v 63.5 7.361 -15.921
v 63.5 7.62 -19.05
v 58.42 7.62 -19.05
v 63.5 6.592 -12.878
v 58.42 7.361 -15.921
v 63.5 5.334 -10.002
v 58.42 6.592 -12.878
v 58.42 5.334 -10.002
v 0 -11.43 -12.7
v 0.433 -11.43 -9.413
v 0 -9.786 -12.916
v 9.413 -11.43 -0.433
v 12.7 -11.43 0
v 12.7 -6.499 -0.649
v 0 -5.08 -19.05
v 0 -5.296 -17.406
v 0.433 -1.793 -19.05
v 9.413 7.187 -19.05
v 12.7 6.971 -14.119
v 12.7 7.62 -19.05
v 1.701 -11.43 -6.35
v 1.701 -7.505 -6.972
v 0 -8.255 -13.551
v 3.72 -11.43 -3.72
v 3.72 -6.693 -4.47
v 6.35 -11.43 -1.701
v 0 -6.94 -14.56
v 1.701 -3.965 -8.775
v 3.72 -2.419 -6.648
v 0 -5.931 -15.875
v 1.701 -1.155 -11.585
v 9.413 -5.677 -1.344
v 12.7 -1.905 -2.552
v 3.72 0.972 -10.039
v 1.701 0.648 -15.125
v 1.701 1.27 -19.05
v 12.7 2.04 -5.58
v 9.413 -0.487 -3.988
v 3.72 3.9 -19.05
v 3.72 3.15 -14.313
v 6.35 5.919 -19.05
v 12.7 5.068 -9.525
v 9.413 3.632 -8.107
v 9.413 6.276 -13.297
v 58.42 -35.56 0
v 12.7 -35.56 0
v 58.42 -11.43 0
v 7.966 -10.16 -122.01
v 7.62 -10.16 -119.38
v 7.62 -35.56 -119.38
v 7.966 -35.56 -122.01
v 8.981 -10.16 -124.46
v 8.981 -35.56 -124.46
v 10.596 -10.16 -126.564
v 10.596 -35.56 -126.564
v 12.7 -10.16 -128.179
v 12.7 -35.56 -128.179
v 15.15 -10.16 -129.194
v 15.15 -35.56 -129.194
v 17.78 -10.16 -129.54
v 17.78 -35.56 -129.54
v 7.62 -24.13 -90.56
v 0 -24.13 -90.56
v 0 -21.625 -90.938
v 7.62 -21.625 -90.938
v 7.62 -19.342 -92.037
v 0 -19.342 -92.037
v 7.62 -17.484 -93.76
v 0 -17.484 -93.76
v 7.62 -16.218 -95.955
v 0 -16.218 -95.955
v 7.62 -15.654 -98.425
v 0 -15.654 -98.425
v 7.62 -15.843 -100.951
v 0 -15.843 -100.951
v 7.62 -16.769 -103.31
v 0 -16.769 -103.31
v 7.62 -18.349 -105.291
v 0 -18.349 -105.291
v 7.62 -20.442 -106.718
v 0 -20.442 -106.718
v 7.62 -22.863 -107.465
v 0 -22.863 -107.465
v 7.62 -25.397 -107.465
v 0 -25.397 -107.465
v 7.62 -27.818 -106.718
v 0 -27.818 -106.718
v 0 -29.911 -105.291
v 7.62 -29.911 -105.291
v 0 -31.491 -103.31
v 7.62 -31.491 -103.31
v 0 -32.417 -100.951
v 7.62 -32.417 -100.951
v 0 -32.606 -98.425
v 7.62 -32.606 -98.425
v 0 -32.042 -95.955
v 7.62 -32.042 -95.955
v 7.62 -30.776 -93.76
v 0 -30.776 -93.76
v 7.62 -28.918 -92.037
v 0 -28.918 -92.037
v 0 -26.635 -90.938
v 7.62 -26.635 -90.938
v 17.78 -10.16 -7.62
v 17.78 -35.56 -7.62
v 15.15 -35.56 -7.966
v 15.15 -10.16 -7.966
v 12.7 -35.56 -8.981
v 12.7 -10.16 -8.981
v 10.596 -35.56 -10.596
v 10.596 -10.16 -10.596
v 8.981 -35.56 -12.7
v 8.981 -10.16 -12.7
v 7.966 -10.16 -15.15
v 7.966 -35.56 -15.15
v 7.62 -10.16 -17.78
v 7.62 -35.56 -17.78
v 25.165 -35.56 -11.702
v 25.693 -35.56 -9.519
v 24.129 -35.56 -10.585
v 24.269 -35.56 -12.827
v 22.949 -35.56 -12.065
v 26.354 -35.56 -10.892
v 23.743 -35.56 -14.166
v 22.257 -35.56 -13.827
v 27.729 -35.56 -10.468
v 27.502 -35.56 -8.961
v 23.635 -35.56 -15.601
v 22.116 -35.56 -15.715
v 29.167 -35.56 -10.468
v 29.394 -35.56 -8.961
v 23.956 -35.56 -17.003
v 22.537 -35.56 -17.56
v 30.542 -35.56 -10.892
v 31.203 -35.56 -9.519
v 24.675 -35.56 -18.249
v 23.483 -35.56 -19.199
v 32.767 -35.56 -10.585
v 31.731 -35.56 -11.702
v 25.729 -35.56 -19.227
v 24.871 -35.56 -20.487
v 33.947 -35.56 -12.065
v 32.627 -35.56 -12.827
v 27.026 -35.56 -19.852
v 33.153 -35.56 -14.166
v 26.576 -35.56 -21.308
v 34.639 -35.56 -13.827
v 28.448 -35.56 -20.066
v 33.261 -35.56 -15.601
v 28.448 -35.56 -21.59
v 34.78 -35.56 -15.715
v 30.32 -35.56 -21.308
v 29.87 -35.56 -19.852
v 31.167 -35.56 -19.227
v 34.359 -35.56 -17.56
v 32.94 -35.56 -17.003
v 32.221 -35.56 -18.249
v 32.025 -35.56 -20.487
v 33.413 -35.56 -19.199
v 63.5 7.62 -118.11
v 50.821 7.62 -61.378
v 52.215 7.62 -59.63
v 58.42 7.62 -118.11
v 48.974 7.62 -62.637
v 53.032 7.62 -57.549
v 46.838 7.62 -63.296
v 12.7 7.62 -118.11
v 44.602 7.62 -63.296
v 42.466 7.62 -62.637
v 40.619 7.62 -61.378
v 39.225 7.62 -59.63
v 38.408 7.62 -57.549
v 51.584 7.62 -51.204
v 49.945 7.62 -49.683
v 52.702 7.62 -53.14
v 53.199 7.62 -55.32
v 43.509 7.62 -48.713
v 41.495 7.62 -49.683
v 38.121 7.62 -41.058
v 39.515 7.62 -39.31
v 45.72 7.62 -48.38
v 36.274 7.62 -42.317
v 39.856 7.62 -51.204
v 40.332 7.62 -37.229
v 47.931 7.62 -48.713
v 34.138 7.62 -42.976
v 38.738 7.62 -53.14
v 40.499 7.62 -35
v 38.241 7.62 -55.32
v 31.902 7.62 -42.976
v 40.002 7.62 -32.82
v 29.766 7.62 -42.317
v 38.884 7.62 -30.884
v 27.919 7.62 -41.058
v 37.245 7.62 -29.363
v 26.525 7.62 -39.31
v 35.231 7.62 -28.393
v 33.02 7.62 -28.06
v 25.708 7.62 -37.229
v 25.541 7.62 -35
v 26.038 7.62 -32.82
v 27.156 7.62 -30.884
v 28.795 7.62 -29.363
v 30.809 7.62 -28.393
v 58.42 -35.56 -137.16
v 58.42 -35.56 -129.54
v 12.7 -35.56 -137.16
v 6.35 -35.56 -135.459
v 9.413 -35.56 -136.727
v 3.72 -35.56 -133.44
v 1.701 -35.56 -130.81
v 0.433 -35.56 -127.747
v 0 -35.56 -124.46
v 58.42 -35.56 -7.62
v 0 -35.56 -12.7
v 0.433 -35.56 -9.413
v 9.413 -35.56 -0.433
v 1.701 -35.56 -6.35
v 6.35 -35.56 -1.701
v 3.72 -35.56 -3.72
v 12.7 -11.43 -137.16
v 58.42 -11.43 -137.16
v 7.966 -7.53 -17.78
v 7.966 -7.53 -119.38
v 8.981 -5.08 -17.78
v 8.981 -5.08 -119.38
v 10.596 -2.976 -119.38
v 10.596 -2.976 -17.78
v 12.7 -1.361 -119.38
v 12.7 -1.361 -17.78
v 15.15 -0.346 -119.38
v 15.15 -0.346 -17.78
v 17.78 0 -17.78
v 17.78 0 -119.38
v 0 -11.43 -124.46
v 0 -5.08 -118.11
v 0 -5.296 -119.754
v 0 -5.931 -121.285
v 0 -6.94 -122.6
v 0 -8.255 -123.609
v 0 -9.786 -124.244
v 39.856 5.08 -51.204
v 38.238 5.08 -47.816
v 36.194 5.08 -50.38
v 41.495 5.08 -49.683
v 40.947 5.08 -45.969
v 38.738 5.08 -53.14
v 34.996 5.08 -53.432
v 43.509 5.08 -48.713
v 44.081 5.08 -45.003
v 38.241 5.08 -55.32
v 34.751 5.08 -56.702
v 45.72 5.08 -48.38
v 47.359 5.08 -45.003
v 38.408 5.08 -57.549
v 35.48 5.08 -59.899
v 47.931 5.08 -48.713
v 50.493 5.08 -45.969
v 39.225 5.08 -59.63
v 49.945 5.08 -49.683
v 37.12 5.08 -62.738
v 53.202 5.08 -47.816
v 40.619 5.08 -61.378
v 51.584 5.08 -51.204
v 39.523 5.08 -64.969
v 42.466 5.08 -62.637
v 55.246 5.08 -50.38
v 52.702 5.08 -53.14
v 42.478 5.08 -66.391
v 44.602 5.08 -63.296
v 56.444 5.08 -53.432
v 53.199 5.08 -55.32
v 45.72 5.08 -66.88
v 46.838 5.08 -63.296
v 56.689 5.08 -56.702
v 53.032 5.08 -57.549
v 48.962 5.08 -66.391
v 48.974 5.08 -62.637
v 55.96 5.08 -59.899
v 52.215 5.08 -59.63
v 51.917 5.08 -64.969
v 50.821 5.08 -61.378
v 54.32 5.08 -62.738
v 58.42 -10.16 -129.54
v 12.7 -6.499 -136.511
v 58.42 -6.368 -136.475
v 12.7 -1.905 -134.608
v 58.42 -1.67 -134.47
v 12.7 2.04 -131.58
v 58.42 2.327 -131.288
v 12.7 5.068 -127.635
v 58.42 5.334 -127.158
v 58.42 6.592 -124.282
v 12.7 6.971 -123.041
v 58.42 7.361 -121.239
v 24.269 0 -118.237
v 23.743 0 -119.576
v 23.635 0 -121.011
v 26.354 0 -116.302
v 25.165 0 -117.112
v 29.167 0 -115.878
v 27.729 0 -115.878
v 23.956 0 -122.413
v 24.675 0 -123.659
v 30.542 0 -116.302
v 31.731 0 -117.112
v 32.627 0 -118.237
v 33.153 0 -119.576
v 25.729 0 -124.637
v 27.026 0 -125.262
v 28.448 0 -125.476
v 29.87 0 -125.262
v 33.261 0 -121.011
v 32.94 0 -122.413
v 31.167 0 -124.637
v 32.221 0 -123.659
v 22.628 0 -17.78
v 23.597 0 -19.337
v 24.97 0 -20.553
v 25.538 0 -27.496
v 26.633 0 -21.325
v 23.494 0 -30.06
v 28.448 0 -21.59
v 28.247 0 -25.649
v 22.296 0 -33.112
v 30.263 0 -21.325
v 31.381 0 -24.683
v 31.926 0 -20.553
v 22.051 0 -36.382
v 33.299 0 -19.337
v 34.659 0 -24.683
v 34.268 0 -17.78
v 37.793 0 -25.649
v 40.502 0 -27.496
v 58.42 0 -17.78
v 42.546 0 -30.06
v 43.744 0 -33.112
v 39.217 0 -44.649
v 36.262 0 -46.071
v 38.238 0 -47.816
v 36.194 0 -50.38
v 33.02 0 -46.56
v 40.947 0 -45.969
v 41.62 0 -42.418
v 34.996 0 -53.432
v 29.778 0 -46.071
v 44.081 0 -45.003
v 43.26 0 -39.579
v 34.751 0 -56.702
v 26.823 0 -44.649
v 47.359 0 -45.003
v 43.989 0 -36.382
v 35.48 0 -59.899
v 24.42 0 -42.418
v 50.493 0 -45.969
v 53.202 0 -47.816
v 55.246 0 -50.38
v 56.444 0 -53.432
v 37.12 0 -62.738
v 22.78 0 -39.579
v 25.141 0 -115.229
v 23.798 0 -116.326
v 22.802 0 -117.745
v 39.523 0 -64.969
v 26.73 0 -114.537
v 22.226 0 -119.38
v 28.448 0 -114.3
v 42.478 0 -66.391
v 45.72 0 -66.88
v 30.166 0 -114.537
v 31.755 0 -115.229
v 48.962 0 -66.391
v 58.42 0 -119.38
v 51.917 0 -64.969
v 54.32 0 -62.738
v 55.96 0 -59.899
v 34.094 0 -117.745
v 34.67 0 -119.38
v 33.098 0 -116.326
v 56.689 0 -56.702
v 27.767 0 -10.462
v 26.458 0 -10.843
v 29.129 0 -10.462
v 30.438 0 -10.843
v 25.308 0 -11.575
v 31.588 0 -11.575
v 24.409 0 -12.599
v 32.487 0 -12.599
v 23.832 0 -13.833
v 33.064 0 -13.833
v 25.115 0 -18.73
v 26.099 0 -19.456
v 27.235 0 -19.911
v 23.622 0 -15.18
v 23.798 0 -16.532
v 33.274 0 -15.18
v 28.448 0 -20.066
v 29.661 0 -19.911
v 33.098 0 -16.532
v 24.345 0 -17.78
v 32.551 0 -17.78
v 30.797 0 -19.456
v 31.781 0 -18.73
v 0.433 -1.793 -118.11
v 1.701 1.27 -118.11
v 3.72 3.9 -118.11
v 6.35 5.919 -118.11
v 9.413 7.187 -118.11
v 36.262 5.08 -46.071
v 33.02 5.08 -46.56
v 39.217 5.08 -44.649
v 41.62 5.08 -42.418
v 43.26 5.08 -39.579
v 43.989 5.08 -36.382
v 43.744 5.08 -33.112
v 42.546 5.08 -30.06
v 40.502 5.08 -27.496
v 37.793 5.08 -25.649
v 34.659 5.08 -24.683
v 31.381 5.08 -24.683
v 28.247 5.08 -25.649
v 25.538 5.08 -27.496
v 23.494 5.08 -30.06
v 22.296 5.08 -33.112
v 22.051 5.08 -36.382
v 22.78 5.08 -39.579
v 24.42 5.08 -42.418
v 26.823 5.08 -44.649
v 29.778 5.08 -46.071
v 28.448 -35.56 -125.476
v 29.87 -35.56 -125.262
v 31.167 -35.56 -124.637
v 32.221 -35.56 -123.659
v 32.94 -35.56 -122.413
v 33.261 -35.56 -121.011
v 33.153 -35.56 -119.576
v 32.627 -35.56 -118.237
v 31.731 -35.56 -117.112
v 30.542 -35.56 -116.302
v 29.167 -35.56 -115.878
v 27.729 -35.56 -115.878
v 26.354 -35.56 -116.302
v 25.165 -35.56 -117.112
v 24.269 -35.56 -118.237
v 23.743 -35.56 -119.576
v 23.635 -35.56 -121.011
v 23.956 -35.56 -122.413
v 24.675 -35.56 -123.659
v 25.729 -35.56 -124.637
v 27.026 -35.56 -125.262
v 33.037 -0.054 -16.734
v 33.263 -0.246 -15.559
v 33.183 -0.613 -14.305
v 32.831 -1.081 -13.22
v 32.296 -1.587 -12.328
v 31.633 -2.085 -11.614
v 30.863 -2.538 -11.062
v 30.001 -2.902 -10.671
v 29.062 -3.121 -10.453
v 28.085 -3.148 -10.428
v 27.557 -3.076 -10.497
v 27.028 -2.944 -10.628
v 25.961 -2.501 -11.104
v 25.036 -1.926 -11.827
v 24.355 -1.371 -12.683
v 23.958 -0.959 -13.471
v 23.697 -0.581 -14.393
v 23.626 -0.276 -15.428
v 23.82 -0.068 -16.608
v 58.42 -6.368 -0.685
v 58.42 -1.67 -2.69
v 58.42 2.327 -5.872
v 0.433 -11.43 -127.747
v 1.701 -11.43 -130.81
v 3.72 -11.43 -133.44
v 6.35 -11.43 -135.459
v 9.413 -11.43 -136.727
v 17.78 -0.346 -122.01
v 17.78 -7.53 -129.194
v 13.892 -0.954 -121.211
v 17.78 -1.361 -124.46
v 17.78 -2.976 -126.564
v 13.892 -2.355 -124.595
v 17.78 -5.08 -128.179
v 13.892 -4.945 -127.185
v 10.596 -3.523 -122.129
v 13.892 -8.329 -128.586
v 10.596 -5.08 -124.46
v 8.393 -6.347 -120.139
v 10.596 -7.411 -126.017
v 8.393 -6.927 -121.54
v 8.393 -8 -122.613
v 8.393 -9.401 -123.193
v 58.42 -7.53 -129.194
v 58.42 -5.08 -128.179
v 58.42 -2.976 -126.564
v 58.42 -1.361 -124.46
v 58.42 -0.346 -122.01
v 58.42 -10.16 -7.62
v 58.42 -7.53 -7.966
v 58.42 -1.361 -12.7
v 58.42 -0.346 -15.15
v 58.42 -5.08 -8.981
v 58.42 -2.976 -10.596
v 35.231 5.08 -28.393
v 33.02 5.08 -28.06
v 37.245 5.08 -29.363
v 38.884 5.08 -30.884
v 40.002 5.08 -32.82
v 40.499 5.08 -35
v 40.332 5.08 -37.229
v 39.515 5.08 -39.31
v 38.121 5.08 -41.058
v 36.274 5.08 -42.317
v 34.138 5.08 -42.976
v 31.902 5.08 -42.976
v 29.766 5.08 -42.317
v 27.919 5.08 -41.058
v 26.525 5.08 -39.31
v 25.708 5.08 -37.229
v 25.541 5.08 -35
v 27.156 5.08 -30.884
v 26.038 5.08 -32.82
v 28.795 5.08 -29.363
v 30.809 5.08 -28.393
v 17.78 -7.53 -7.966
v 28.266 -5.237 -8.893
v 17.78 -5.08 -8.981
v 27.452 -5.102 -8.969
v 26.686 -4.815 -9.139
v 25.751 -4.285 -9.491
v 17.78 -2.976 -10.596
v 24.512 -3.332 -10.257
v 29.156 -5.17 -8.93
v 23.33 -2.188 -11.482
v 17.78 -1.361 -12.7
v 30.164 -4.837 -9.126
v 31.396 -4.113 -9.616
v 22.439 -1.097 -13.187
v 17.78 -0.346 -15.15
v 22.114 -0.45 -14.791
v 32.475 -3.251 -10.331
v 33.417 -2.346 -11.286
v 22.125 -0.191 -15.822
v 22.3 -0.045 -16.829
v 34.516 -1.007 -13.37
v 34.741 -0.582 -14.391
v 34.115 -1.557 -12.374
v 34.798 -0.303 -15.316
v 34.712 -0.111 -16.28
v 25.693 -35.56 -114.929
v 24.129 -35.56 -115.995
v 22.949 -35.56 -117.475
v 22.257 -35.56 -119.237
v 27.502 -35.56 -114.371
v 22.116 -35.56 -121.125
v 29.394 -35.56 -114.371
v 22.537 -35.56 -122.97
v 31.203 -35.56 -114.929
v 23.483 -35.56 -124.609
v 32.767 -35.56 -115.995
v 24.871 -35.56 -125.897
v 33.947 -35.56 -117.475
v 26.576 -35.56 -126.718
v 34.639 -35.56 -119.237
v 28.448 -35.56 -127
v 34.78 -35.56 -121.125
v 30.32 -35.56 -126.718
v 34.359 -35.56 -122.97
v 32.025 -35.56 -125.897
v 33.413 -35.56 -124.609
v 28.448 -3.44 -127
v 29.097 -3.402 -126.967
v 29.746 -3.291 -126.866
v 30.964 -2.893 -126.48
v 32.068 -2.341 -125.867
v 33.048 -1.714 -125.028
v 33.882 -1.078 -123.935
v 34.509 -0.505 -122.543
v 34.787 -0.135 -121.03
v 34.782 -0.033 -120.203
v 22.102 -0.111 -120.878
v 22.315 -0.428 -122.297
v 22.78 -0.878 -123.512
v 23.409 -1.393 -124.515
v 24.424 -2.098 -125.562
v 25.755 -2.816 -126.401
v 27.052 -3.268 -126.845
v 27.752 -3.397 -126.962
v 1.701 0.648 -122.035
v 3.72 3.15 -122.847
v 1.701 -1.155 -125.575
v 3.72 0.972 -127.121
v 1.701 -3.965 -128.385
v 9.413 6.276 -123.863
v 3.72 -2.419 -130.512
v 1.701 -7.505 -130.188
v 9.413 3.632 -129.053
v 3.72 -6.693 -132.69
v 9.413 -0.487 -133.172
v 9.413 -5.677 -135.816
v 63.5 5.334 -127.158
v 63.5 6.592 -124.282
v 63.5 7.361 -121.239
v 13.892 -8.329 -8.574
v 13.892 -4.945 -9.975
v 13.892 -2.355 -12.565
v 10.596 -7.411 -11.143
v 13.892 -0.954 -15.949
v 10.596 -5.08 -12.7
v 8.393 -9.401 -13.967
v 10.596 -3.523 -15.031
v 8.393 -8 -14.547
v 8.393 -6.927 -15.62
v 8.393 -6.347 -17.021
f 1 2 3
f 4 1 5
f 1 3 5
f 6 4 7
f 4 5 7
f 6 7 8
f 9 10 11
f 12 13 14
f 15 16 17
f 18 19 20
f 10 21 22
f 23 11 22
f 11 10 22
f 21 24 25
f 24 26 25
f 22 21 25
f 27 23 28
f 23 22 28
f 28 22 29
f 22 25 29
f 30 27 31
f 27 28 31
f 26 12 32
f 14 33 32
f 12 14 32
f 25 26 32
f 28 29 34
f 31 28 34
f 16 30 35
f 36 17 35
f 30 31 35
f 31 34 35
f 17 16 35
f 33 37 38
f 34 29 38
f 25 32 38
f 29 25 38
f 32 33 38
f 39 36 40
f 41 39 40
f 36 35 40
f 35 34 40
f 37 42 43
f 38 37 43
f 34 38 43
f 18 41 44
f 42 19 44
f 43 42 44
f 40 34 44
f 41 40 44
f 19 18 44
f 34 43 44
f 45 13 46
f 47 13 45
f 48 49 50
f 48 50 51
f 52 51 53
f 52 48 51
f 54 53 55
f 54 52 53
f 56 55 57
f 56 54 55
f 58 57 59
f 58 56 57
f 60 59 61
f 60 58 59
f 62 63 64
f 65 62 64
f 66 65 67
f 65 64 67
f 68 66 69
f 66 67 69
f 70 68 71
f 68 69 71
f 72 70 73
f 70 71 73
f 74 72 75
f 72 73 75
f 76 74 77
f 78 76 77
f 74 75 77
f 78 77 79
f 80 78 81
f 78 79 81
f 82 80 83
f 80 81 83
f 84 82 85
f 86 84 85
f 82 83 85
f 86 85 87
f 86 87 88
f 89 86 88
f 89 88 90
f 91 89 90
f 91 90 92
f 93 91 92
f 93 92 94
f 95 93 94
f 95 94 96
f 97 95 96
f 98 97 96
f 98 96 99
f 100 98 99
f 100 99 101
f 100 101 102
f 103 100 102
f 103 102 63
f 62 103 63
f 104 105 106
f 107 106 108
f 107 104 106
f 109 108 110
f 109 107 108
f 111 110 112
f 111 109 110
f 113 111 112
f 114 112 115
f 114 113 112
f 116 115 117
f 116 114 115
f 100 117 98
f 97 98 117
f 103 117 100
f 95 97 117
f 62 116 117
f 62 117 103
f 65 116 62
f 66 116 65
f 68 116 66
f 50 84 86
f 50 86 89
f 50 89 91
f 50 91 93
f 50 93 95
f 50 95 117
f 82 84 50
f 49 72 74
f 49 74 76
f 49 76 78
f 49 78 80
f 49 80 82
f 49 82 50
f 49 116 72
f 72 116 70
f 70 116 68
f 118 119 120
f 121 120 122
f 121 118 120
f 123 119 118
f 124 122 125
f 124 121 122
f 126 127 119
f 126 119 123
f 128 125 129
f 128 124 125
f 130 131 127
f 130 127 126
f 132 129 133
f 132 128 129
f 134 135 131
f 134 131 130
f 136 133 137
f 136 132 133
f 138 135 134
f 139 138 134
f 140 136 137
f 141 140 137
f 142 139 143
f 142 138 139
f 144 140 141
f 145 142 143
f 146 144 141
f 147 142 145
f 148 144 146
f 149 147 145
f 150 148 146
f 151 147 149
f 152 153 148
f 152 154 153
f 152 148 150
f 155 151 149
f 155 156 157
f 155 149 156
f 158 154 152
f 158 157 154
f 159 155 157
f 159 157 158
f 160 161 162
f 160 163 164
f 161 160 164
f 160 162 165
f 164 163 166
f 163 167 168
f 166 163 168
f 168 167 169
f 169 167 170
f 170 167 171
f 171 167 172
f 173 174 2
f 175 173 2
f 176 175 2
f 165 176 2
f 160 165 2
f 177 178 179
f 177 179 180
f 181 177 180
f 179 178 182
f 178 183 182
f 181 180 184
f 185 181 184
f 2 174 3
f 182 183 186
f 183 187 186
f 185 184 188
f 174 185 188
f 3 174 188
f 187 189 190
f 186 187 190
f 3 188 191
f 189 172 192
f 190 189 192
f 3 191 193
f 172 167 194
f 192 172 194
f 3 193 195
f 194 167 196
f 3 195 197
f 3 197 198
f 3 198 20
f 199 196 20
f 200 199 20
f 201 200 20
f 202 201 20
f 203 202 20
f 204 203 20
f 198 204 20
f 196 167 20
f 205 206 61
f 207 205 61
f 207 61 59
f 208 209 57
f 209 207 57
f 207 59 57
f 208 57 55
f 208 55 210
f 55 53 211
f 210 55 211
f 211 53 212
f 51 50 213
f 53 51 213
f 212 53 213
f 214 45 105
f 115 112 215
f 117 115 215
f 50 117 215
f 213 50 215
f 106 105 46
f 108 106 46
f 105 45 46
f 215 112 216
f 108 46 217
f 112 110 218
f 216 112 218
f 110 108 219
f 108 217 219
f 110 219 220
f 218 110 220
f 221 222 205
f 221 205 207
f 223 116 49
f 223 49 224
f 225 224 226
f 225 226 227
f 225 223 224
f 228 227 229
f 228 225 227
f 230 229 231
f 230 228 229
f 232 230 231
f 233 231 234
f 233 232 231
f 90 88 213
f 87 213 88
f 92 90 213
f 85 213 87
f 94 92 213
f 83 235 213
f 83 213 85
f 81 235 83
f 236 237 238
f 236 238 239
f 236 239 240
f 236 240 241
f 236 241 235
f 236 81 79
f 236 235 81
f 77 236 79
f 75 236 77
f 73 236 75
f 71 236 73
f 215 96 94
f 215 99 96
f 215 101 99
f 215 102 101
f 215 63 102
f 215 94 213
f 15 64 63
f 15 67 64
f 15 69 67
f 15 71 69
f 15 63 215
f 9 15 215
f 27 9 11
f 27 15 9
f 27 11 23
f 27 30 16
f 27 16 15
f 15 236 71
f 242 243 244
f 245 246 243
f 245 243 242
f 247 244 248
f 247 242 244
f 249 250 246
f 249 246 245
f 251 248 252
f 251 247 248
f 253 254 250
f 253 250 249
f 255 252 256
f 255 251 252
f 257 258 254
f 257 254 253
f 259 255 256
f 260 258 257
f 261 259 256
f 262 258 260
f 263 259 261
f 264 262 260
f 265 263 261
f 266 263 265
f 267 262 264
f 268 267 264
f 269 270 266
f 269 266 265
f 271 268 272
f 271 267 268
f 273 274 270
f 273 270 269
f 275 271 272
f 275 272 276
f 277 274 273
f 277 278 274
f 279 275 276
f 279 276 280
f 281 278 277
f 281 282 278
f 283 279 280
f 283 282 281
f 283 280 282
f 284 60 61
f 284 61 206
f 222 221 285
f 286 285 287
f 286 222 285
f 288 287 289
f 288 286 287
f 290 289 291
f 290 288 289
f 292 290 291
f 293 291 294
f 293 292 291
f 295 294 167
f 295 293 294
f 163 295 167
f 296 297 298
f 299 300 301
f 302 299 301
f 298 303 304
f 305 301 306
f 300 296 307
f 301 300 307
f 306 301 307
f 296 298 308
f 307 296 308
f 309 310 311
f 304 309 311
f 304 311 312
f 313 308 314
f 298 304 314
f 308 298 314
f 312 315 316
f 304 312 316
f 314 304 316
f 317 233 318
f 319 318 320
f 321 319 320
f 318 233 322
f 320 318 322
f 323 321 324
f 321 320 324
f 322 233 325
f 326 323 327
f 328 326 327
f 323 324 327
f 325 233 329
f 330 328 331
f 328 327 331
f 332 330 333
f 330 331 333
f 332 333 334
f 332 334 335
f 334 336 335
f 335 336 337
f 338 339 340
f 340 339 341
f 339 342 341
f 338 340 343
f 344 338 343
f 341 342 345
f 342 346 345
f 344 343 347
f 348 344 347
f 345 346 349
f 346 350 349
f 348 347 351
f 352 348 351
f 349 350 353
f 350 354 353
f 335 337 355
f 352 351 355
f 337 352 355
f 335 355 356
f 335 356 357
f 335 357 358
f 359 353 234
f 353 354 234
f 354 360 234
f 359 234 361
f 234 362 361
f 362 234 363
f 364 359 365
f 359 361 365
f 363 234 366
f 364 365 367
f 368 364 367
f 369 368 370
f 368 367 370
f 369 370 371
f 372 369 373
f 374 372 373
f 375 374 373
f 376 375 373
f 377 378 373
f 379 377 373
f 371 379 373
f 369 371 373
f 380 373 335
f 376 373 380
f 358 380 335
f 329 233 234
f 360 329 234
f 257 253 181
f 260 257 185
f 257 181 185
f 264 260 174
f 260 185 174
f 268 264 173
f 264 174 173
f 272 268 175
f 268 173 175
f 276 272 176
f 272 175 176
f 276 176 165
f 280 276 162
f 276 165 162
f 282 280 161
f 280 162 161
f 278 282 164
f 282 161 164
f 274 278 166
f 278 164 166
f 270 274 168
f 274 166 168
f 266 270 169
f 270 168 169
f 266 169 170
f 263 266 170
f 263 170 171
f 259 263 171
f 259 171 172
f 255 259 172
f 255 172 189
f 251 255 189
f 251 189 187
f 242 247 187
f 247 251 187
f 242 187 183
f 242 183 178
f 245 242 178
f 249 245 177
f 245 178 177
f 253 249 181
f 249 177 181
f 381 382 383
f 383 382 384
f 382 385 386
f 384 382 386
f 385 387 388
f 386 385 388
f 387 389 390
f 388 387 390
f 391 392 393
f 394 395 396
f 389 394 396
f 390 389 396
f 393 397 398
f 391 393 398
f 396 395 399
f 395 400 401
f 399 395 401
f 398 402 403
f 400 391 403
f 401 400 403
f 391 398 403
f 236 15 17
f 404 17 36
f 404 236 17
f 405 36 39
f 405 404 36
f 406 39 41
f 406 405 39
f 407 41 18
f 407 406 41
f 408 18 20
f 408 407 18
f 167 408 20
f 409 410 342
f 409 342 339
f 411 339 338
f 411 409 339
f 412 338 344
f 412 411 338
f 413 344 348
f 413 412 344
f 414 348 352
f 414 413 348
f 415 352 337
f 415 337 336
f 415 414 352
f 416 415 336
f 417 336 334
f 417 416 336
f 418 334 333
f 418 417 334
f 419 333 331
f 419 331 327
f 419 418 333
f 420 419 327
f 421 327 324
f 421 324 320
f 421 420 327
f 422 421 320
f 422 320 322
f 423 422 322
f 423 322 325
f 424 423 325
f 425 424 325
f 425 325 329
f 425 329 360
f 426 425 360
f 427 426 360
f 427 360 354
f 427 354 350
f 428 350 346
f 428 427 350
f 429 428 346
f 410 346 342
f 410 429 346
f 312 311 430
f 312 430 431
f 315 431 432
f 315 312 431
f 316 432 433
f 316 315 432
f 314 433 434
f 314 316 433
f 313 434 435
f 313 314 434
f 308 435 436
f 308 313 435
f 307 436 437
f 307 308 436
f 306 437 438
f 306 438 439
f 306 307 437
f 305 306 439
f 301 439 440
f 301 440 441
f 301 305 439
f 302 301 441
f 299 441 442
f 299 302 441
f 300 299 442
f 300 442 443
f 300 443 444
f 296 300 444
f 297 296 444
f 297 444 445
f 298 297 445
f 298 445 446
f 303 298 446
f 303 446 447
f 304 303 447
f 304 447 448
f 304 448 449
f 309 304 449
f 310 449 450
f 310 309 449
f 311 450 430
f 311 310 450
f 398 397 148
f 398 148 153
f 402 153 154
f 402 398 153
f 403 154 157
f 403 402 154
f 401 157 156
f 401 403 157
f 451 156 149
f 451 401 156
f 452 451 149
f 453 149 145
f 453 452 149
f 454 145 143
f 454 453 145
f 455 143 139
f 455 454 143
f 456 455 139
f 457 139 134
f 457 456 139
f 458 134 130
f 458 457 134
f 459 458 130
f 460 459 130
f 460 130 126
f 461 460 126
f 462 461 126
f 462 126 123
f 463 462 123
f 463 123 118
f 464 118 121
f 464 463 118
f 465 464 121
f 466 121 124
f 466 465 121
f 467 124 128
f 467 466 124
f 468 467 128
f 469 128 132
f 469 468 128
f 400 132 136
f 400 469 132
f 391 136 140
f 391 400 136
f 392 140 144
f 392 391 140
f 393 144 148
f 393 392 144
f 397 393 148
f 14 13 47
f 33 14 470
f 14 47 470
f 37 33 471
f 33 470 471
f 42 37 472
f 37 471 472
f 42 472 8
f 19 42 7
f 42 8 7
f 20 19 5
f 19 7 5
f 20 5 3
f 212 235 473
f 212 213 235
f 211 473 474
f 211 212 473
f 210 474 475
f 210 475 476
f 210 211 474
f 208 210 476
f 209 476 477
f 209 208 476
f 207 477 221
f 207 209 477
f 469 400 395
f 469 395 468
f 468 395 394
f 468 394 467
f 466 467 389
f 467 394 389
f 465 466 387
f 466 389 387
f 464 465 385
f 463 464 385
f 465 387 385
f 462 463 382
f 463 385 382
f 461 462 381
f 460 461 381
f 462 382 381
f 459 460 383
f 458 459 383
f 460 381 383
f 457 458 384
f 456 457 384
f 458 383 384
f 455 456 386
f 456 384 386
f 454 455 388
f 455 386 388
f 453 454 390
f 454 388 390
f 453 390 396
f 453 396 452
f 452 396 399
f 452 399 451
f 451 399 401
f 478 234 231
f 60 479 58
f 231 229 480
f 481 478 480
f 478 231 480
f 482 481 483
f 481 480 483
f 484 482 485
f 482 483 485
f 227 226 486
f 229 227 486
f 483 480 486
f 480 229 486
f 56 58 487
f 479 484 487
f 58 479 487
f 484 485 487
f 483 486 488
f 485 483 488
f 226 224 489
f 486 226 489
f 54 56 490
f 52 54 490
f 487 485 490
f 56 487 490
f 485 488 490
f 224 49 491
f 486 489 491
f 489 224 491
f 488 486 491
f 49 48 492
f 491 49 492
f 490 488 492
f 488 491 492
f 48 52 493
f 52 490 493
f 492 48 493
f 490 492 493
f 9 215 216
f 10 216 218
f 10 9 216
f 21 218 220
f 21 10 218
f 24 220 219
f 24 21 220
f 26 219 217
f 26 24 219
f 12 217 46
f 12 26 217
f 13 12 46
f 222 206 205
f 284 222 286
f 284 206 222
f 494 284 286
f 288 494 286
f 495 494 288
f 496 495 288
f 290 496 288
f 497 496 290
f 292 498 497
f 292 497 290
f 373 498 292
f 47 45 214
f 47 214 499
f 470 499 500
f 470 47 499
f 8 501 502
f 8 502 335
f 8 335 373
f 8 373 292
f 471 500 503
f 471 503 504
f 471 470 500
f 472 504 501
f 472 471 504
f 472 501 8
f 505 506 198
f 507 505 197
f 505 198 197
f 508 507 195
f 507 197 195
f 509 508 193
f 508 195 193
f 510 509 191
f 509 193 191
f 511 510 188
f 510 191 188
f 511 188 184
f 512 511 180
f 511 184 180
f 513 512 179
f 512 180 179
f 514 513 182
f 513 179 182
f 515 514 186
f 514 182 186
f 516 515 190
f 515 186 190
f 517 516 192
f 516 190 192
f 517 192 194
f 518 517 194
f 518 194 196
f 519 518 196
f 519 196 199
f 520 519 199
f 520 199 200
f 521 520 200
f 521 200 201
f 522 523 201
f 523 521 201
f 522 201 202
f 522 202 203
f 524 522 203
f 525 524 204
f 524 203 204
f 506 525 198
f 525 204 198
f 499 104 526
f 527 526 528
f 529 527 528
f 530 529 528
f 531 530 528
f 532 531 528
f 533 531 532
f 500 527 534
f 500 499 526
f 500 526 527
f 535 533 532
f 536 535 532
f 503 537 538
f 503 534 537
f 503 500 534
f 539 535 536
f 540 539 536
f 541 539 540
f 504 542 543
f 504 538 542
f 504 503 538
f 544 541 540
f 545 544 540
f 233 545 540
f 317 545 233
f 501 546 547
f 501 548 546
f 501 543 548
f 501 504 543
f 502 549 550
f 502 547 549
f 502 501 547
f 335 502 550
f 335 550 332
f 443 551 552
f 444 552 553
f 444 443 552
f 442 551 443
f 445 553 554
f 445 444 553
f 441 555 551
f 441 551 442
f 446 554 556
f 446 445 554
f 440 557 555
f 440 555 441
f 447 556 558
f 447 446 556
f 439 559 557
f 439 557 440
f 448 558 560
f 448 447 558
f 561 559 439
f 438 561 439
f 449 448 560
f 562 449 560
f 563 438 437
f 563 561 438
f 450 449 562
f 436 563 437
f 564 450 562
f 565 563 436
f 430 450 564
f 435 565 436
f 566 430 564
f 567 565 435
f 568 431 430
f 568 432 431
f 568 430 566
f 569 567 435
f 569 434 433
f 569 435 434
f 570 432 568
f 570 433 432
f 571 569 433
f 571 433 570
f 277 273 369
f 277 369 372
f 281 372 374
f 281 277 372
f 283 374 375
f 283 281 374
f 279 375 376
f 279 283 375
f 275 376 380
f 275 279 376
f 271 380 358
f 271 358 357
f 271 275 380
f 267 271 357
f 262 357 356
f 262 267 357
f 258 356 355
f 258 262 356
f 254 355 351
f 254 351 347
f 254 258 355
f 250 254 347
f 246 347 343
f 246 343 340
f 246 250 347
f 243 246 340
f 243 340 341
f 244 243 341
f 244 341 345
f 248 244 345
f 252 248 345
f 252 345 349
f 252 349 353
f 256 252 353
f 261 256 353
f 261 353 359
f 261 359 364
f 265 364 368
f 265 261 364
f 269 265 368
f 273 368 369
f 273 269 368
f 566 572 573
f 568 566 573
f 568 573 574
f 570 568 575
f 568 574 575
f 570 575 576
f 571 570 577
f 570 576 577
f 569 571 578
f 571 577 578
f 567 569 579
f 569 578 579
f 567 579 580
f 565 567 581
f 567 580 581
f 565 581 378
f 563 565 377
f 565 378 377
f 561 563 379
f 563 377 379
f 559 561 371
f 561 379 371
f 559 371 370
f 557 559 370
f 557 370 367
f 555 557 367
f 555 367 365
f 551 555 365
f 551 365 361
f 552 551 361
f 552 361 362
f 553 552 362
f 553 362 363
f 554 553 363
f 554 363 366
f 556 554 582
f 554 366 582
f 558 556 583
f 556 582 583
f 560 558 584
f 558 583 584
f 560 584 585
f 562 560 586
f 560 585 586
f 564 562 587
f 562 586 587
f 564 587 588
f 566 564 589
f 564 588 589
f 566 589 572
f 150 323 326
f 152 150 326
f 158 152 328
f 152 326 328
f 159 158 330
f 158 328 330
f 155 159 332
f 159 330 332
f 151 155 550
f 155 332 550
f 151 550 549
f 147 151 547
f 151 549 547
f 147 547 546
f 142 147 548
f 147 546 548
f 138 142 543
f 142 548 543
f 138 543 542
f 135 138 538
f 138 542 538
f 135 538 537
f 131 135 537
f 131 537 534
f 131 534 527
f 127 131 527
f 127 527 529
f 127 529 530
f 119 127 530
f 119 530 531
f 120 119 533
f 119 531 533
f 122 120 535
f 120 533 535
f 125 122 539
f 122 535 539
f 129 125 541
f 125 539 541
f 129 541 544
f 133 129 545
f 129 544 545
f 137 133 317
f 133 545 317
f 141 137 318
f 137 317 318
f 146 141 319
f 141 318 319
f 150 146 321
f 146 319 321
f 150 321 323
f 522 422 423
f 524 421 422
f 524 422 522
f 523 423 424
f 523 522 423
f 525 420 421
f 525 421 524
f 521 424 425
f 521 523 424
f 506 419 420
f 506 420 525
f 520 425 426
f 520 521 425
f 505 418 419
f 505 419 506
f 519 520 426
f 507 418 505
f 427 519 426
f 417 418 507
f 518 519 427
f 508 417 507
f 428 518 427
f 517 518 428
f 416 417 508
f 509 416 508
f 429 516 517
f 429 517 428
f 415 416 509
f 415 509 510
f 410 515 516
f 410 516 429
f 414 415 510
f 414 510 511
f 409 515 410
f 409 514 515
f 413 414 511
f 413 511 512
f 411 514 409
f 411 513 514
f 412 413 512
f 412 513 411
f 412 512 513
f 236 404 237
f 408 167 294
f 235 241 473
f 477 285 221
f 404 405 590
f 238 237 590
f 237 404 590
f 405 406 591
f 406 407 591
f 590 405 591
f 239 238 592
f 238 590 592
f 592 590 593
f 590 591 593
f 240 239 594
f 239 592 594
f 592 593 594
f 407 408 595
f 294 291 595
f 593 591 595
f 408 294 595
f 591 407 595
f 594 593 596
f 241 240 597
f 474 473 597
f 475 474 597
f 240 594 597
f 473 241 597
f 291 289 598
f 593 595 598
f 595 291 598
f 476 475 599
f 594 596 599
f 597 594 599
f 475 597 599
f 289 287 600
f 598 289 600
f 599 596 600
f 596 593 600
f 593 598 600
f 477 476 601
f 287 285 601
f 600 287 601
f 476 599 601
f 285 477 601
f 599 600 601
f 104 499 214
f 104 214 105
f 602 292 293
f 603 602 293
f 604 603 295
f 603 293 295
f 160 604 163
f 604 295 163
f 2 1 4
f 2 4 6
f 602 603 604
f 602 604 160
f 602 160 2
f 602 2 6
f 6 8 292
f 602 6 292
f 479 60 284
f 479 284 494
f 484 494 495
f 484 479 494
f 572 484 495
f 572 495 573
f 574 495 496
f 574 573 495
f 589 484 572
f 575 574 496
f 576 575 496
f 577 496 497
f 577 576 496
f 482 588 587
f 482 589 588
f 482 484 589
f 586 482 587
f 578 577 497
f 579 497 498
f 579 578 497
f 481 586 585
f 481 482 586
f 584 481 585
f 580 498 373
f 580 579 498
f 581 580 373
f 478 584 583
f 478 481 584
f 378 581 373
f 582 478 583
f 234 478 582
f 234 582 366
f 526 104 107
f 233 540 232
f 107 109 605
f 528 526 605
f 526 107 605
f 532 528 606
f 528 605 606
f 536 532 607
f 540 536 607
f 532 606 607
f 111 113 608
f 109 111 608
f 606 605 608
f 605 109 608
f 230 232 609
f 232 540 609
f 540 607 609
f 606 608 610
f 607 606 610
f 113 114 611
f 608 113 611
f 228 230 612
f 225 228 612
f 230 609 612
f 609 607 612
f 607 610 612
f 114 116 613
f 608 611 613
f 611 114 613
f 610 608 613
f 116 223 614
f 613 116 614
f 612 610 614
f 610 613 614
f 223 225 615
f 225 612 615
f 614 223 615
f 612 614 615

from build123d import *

# Parameters (mm, degrees)
SKETCH1_W           = 58.42
SKETCH1_H           = 137.16
BOSS_EXTRUDE1_DEPTH = 7.62
SKETCH2_R           = 6.35
SKETCH2_R_2         = 4.826
BOSS_EXTRUDE2_DEPTH = 35.56
BOSS_EXTRUDE3_DEPTH = 35.56
FILLET1_R           = 19.05
FILLET2_R           = 12.7
BOSS_EXTRUDE4_DEPTH = 5.08
SKETCH7_R           = 7.5
CUT_EXTRUDE1_DEPTH  = 158.192964219
CUT_EXTRUDE2_START  = -5.08
SKETCH8_R           = 11
SKETCH8_R_2         = 7.5
CUT_EXTRUDE2_DEPTH  = 5.08
FILLET3_R           = 10.16
CUT_EXTRUDE3_REACH  = 157.273
SKETCH9_R           = 8.5


with BuildPart() as part:
    # Sketch1 → Boss-Extrude1 (new body)
    with BuildSketch(Plane(origin=(0, 0, 0), x_dir=(1, 0, 0), z_dir=(0, 1, 0))):
        with Locations((29.21, 68.58)):
            Rectangle(SKETCH1_W, SKETCH1_H)
    extrude(amount=BOSS_EXTRUDE1_DEPTH)

    # Sketch2 → Boss-Extrude2 (add)
    # profile 1 of 2: a face of its own
    with BuildSketch(Plane.XZ):
        with Locations(Location((28.448, -120.65, 0), (0, 0, 270))):
            Circle(SKETCH2_R)
        with Locations(Location((28.448, -120.65, 0), (0, 0, 270))):
            Circle(SKETCH2_R_2, mode=Mode.SUBTRACT)
    # profile 2 of 2: a face of its own
    with BuildSketch(Plane.XZ):
        with Locations(Location((28.448, -15.24, 0), (0, 0, 270))):
            Circle(SKETCH2_R)
        with Locations(Location((28.448, -15.24, 0), (0, 0, 270))):
            Circle(SKETCH2_R_2, mode=Mode.SUBTRACT)
    extrude(amount=BOSS_EXTRUDE2_DEPTH)

    # Sketch3 → Boss-Extrude3 (add)
    with BuildSketch(Plane.XZ):
        Polygon((58.42, -137.16), (0, -137.16), (0, 0), (58.42, 0), (58.42, -7.62), (7.62, -7.62), (7.62, -129.54), (58.42, -129.54), align=None)
    extrude(amount=BOSS_EXTRUDE3_DEPTH)

    # Fillet1
    fillet1_edges = [part.edges().sort_by_distance(p)[0] for p in [
        (29.21, 7.62, -137.16),
        (29.21, 7.62, 0),
    ]]
    fillet(fillet1_edges, radius=FILLET1_R)

    # Fillet2
    fillet2_edges = [part.edges().sort_by_distance(p)[0] for p in [
        (0, 7.62, -68.58),
        (0, -23.495, 0),
        (0, -23.495, -137.16),
        (0, 2.040384182, -131.580384182),
        (0, 2.040384182, -5.579615818),
    ]]
    fillet(fillet2_edges, radius=FILLET2_R)

    # Sketch4 → Boss-Extrude4 (add)
    with BuildSketch(Plane(origin=(58.42, 0, 0), x_dir=(0, 0, -1), z_dir=(1, 0, 0))):
        with BuildLine():
            Line((10.00175133, 5.334), (127.15824867, 5.334))
            ThreePointArc((127.15824867, 5.334), (122.77627796, 7.039660257), (118.11, 7.62))
            Line((118.11, 7.62), (19.05, 7.62))
            ThreePointArc((19.05, 7.62), (14.38372204, 7.039660257), (10.00175133, 5.334))
        make_face()
    extrude(amount=BOSS_EXTRUDE4_DEPTH)

    # Sketch7 → Cut-Extrude1 (cut, through all)
    with BuildSketch(Plane(origin=(0, 7.62, 0), x_dir=(1, 0, 0), z_dir=(0, 1, 0))):
        with Locations(Location((45.72, 55.88, 0), (0, 0, 270))):
            Circle(SKETCH7_R)
        with Locations(Location((33.02, 35.56, 0), (0, 0, 270))):
            Circle(SKETCH7_R)
    extrude(amount=-CUT_EXTRUDE1_DEPTH, mode=Mode.SUBTRACT)

    # Sketch8 → Cut-Extrude2 (cut)
    # profile 1 of 2: a face of its own
    with BuildSketch(Plane.XZ.offset(CUT_EXTRUDE2_START)):
        with Locations(Location((45.72, -55.88, 0), (0, 0, 270))):
            Circle(SKETCH8_R)
        with Locations(Location((45.72, -55.88, 0), (0, 0, 90))):
            Circle(SKETCH8_R_2, mode=Mode.SUBTRACT)
    # profile 2 of 2: a face of its own
    with BuildSketch(Plane.XZ.offset(CUT_EXTRUDE2_START)):
        with Locations(Location((33.02, -35.56, 0), (0, 0, 270))):
            Circle(SKETCH8_R)
        with Locations(Location((33.02, -35.56, 0), (0, 0, 90))):
            Circle(SKETCH8_R_2, mode=Mode.SUBTRACT)
    extrude(amount=CUT_EXTRUDE2_DEPTH, mode=Mode.SUBTRACT)

    # Fillet3
    # the kernel refuses this fillet: 10.16 mm, written as the material it adds along each edge
    with BuildSketch(Plane(origin=(17.78, -10.16, -119.38), x_dir=(0, 1, 0), z_dir=(-1, 0, 0))) as fillet3_piece_1_section:
        Polygon((0, 0), (FILLET3_R * 1.02, 0), (FILLET3_R * 1.02, FILLET3_R * 1.02), (0, FILLET3_R * 1.02), align=None)
    fillet3_piece_1 = extrude(amount=FILLET3_R * 1.02, mode=Mode.PRIVATE)
    fillet3_piece_1 = fillet3_piece_1 - Plane(origin=(17.78, -10.16, -119.38), x_dir=(0, -0.7071067811865475, 0.7071067811865475), z_dir=(-1, 0, 0)) * Sphere(FILLET3_R, mode=Mode.PRIVATE)
    add(fillet3_piece_1)
    with BuildSketch(Plane(origin=(17.78, -10.16, -17.78), x_dir=(0, 0, 1), z_dir=(-1, 0, 0))) as fillet3_piece_2_section:
        Polygon((0, 0), (FILLET3_R * 1.02, 0), (FILLET3_R * 1.02, FILLET3_R * 1.02), (0, FILLET3_R * 1.02), align=None)
    fillet3_piece_2 = extrude(amount=FILLET3_R * 1.02, mode=Mode.PRIVATE)
    fillet3_piece_2 = fillet3_piece_2 - Plane(origin=(17.78, -10.16, -17.78), x_dir=(0, -0.7071067811865475, -0.7071067811865475), z_dir=(-1, 0, 0)) * Sphere(FILLET3_R, mode=Mode.PRIVATE)
    add(fillet3_piece_2)
    with BuildSketch(Plane(origin=(17.78, 0, -129.54), x_dir=(0, 0, 1), z_dir=(1, 0, 0))) as fillet3_piece_3_section:
        with BuildLine():
            CenterArc((FILLET3_R, FILLET3_R), FILLET3_R, 180, 90)
            Line((0, FILLET3_R), (0, 0))
            Line((0, 0), (FILLET3_R, 0))
        make_face()
    fillet3_piece_3 = extrude(amount=40.64, mode=Mode.PRIVATE)
    fillet3_piece_3 = fillet3_piece_3 - Plane(origin=(28.448, -2.379056343, -120.65), x_dir=(0, 0, -1), z_dir=(0, 1, 0)) * Cylinder(4.826, 122, mode=Mode.PRIVATE)
    add(fillet3_piece_3)
    with BuildSketch(Plane(origin=(7.62, 0, -17.78), x_dir=(1, 0, 0), z_dir=(0, 0, -1))) as fillet3_piece_4:
        with BuildLine():
            CenterArc((FILLET3_R, FILLET3_R), FILLET3_R, 180, 90)
            Line((0, FILLET3_R), (0, 0))
            Line((0, 0), (FILLET3_R, 0))
        make_face()
    extrude(amount=101.6)
    with BuildSketch(Plane(origin=(7.62, -10.16, -129.54), x_dir=(1, 0, 0), z_dir=(0, -1, 0))) as fillet3_piece_5:
        with BuildLine():
            CenterArc((FILLET3_R, FILLET3_R), FILLET3_R, 180, 90)
            Line((0, FILLET3_R), (0, 0))
            Line((0, 0), (FILLET3_R, 0))
        make_face()
    extrude(amount=25.4)
    with BuildSketch(Plane(origin=(58.42, 0, -7.62), x_dir=(0, -1, 0), z_dir=(-1, 0, 0))) as fillet3_piece_6_section:
        with BuildLine():
            CenterArc((FILLET3_R, -FILLET3_R), FILLET3_R, 90, 90)
            Line((0, -FILLET3_R), (0, 0))
            Line((0, 0), (FILLET3_R, 0))
        make_face()
    fillet3_piece_6 = extrude(amount=40.64, mode=Mode.PRIVATE)
    fillet3_piece_6 = fillet3_piece_6 - Plane(origin=(28.448, -2.418481563, -15.24), x_dir=(0, 0, -1), z_dir=(0, 1, 0)) * Cylinder(4.826, 122, mode=Mode.PRIVATE)
    add(fillet3_piece_6)
    with BuildSketch(Plane(origin=(7.62, -10.16, -7.62), x_dir=(1, 0, 0), z_dir=(0, -1, 0))) as fillet3_piece_7:
        with BuildLine():
            CenterArc((FILLET3_R, -FILLET3_R), FILLET3_R, 90, 90)
            Line((0, -FILLET3_R), (0, 0))
            Line((0, 0), (FILLET3_R, 0))
        make_face()
    extrude(amount=25.4)

    # Sketch9 → Cut-Extrude3 (cut, up to next)
    with BuildSketch(Plane.ZY, mode=Mode.PRIVATE) as cut_extrude3_sk1:
        with Locations((-99.06, -24.13)):
            Circle(SKETCH9_R)
    cut_extrude3_tool1 = extrude(cut_extrude3_sk1.sketch, amount=-CUT_EXTRUDE3_REACH, mode=Mode.PRIVATE) & part.part
    add(cut_extrude3_tool1.solids().sort_by_distance((0, -24.13, -99.06))[0], mode=Mode.SUBTRACT)


solid = part.part
